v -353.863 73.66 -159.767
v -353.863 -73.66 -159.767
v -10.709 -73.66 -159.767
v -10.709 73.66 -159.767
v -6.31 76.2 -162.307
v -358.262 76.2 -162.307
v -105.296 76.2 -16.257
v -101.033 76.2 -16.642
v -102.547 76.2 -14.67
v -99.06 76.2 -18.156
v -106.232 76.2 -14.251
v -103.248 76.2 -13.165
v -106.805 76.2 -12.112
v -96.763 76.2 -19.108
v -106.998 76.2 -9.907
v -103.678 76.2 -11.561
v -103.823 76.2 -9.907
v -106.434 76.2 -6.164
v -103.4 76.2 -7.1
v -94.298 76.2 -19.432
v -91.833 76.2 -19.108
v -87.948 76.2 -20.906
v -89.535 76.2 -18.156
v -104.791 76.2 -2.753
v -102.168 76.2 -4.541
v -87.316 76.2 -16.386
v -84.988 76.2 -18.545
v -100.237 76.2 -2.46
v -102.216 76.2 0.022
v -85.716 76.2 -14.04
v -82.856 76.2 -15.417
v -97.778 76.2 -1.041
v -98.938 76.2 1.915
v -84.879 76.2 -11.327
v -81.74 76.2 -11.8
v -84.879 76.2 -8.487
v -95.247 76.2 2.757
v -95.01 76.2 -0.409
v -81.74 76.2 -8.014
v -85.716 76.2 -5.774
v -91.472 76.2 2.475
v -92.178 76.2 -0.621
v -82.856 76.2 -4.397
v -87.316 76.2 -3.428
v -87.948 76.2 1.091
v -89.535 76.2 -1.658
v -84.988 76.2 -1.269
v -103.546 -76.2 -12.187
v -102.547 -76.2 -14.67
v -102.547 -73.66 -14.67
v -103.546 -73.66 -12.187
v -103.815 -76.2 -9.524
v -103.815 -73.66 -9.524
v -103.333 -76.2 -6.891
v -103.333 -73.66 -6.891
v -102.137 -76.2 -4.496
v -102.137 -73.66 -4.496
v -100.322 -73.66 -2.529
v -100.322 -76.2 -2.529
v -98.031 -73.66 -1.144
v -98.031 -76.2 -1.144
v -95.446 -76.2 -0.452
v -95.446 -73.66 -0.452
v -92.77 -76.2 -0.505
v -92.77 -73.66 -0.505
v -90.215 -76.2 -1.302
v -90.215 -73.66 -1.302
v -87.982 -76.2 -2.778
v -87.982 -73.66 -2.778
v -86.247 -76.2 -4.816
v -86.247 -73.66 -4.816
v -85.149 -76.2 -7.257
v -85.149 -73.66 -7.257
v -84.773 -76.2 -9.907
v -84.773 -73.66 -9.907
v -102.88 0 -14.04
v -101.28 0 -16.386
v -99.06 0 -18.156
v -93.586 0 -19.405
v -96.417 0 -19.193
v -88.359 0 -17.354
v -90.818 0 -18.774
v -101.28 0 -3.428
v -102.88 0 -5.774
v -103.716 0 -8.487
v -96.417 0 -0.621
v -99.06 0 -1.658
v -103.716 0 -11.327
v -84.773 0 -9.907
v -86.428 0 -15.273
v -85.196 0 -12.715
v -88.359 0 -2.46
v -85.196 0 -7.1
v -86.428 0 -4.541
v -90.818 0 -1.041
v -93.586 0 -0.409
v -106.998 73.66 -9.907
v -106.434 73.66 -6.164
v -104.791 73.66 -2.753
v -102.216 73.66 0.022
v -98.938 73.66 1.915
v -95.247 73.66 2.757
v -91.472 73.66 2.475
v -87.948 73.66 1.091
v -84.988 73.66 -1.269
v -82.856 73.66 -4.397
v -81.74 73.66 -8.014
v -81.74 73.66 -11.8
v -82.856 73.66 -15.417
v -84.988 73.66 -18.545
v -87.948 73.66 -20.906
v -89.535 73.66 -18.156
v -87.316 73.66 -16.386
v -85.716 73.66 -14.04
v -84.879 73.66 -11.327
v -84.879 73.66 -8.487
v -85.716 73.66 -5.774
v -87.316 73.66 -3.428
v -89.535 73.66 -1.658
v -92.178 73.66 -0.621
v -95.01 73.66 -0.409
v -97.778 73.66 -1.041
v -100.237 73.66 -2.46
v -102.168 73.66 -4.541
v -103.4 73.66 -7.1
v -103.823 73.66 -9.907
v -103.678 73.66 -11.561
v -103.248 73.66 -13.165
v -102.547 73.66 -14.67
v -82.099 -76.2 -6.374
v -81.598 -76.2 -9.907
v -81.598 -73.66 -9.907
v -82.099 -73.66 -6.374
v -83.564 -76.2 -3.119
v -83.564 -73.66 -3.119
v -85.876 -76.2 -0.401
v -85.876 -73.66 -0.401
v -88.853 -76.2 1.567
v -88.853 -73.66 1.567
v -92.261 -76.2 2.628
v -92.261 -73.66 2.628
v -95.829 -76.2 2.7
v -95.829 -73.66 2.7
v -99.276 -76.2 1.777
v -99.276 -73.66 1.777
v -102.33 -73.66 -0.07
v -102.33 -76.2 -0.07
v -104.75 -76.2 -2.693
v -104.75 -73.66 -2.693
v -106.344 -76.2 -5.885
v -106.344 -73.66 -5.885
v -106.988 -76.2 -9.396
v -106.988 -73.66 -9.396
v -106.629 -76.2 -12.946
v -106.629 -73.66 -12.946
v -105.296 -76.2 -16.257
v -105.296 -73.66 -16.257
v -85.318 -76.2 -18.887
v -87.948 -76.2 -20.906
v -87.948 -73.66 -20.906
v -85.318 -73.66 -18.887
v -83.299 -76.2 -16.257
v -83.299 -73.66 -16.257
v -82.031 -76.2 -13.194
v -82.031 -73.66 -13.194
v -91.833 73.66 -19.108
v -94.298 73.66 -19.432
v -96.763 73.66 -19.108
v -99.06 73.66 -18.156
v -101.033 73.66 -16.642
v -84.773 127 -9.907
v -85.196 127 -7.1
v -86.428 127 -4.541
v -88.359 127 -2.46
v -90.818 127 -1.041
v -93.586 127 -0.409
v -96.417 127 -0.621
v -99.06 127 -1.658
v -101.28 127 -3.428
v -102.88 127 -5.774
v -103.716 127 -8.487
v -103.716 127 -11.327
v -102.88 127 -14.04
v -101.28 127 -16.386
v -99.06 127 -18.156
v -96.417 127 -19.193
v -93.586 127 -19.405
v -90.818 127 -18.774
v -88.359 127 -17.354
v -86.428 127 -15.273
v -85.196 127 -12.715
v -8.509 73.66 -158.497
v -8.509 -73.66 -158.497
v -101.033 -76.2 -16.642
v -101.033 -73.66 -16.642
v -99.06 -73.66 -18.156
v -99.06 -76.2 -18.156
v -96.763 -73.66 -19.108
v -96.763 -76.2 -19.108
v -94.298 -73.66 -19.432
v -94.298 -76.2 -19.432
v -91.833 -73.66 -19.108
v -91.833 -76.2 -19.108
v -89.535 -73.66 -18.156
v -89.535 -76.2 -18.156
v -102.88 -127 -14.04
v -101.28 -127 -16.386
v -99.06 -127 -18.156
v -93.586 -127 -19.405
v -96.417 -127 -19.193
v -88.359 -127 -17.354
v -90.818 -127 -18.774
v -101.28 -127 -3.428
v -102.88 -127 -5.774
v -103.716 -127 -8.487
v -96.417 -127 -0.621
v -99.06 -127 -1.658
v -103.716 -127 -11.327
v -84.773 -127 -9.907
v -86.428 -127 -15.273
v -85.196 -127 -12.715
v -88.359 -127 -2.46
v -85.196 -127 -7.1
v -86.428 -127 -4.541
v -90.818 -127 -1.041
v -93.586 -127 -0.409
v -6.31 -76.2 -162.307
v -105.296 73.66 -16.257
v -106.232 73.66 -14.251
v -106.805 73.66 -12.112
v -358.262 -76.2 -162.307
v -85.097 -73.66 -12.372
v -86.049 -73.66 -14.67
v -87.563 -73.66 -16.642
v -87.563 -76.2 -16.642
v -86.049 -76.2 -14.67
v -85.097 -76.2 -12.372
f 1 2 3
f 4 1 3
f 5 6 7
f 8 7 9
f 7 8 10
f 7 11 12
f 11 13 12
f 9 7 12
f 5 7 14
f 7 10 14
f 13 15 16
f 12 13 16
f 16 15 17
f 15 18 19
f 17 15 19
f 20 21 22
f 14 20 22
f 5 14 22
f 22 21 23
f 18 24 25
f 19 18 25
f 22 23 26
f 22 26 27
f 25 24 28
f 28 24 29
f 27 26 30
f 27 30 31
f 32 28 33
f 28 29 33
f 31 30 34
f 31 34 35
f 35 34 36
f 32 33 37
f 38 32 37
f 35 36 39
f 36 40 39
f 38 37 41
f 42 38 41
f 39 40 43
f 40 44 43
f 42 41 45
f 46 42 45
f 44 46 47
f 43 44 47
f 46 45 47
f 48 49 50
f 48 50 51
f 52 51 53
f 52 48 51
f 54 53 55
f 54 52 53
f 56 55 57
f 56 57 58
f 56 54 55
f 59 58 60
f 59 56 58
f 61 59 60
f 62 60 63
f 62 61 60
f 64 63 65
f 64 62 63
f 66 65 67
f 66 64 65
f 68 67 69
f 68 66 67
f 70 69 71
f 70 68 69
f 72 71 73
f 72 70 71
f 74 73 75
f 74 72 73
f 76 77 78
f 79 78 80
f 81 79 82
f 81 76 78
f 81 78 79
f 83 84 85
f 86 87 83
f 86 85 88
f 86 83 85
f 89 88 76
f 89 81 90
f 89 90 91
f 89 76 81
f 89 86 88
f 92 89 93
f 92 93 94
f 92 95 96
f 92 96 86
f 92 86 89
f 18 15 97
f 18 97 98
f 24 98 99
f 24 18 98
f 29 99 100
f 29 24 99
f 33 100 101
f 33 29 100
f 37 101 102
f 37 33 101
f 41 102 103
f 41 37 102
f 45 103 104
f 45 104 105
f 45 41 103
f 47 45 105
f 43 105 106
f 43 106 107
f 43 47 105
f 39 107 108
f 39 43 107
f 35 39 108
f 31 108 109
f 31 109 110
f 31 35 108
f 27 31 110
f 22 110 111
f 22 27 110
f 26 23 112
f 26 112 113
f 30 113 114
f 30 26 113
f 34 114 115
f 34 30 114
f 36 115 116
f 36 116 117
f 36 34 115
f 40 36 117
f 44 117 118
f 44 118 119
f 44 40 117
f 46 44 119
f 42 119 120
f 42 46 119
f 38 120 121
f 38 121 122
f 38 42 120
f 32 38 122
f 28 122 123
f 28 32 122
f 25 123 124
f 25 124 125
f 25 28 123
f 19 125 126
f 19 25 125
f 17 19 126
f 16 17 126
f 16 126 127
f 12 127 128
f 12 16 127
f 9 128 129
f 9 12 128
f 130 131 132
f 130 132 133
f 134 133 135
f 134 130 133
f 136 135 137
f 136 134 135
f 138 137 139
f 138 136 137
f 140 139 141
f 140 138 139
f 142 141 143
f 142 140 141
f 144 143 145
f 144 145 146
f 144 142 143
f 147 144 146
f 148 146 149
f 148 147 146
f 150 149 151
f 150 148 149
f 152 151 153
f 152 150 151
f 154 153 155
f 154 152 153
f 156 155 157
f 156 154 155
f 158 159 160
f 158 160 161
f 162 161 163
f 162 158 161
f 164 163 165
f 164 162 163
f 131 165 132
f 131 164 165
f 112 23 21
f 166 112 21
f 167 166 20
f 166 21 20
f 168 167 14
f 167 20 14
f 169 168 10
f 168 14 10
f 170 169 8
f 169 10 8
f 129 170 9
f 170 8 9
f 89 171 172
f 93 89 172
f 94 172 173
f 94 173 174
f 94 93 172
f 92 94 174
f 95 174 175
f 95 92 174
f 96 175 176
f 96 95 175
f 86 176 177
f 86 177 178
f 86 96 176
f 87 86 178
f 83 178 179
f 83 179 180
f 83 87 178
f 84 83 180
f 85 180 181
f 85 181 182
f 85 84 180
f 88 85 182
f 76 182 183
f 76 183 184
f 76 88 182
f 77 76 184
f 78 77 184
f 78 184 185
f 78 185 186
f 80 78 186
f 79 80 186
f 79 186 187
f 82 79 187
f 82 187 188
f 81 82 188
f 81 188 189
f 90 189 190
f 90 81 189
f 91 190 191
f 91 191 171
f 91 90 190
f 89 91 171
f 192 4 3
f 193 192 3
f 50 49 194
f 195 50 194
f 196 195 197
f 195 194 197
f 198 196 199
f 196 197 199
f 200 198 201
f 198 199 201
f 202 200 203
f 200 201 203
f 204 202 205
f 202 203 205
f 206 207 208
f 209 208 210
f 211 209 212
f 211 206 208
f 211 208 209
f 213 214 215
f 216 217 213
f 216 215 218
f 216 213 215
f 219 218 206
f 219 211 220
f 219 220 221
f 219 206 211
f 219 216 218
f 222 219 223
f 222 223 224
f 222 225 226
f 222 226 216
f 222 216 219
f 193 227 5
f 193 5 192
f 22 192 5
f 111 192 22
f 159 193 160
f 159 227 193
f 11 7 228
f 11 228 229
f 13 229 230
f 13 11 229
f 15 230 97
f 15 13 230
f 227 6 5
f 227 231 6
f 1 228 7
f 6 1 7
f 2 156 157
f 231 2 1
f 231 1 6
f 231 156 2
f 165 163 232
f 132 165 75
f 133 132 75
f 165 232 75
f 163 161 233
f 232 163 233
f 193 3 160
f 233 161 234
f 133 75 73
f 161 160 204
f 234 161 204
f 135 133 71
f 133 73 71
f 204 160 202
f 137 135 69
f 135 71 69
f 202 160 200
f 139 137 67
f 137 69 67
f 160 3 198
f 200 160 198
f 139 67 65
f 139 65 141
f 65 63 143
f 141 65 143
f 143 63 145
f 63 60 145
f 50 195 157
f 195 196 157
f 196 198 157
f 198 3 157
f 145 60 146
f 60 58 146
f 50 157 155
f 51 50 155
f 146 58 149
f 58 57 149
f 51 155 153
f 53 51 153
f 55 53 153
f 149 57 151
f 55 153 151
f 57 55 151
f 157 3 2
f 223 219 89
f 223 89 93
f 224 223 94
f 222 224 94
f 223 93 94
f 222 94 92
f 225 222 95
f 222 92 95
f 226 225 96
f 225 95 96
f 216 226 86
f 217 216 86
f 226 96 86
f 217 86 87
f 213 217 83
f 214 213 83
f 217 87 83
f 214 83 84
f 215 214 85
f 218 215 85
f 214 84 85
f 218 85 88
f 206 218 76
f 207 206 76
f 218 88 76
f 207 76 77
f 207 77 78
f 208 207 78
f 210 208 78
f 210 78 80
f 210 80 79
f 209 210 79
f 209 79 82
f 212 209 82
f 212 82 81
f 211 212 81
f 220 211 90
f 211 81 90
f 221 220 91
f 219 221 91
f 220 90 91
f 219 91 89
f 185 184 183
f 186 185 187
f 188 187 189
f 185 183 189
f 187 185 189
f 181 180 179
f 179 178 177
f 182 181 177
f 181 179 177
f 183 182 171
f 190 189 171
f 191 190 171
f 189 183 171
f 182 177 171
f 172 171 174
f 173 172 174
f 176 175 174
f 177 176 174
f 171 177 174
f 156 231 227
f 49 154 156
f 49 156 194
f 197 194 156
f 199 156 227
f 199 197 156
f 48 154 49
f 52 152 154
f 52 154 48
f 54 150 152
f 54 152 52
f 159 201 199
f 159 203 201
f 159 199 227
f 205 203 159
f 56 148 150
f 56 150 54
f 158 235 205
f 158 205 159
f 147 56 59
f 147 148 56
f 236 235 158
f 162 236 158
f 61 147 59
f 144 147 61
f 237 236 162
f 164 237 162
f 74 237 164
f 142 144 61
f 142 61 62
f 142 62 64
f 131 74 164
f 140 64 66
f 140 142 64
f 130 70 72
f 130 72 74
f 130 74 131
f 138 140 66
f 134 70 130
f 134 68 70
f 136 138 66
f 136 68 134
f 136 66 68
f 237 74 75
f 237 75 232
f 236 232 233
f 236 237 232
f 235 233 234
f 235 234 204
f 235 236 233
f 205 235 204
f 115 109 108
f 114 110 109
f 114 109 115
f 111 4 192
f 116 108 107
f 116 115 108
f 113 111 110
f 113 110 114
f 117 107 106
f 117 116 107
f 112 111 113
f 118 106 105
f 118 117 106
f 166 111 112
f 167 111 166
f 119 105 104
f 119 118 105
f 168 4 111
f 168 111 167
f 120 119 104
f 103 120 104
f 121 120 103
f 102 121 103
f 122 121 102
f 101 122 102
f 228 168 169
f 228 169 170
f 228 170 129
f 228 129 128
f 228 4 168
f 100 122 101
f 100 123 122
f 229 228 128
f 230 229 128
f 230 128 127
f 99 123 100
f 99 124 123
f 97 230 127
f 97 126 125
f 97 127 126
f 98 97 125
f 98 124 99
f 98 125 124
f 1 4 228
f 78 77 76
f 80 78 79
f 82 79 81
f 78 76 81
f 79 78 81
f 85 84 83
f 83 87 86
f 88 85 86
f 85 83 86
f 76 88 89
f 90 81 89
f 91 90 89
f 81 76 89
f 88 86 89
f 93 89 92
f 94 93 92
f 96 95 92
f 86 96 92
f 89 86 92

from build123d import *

# Parameters (mm, degrees)
F1_DEPTH  = 76.2
F2_T      = -2.54
F3_DEPTH  = 2.54
F5_DEPTH  = 2.54
F6_DEPTH  = 2.54
F8_DEPTH  = 2.54
F9_DEPTH  = 2.54
F10_R     = 9.525
F11_DEPTH = 127
F12_DEPTH = 127


with BuildPart() as f1:
    # F0 (on Front) → F1 (new body, symmetric)
    with BuildSketch(Plane.XZ):
        Polygon((-358.2624146525, -162.3070820507), (-6.3096905545, -162.3070820507), (-94.297871579, -9.9070820507), align=None)
    extrude(amount=F1_DEPTH, both=True)

    # F2
    f2_openings = [f1.faces().sort_by_distance(p)[0] for p in [
        (-226.280143, 0, -86.107082),
    ]]
    offset(amount=F2_T, openings=f2_openings)

    # F3 (cut): a face of the model
    f3_faces = [f1.faces().sort_by_distance(p)[0] for p in [
        (-53.6033378552, 0, -85.4720820507),
    ]]
    extrude(f3_faces, amount=-F3_DEPTH, mode=Mode.SUBTRACT)

    # F4 (on face) → F5 (join)
    with BuildSketch(Plane.XZ.offset(76.2)):
        with BuildLine():
            ThreePointArc((-87.947871579, -20.9056046787), (-83.299348951, -16.2570820507), (-81.597871579, -9.9070820507))
            ThreePointArc((-81.597871579, -9.9070820507), (-97.5848734518, 2.3601759432), (-105.2963942071, -16.2570820507))
            Line((-105.2963942071, -16.2570820507), (-102.5467635501, -14.6695820507))
            ThreePointArc((-102.5467635501, -14.6695820507), (-96.7631229836, -0.7066385553), (-84.772871579, -9.9070820507))
            ThreePointArc((-84.772871579, -9.9070820507), (-86.048979608, -14.6695820507), (-89.535371579, -18.1559740217))
            Line((-89.535371579, -18.1559740217), (-87.947871579, -20.9056046787))
        make_face()
    extrude(amount=-F5_DEPTH)

    # F4 (on face) → F6 (cut)
    with BuildSketch(Plane.XZ.offset(76.2)):
        with BuildLine():
            Line((-94.297871579, -9.9070820507), (-102.5467635501, -14.6695820507))
            ThreePointArc((-102.5467635501, -14.6695820507), (-96.7631229836, -19.1075255461), (-89.535371579, -18.1559740217))
            Line((-89.535371579, -18.1559740217), (-94.297871579, -9.9070820507))
        make_face()
    extrude(amount=-F6_DEPTH, mode=Mode.SUBTRACT)

    # F7 (on face) → F8 (join)
    with BuildSketch(Plane(origin=(0, 76.2, 0), x_dir=(-1, 0, 0), z_dir=(0, 1, 0))):
        with BuildLine():
            ThreePointArc((105.2963942071, -16.2570820507), (106.5651295729, -13.1940839235), (106.997871579, -9.9070820507))
            ThreePointArc((106.997871579, -9.9070820507), (87.947871579, 1.0914405774), (87.947871579, -20.9056046787))
            Line((87.947871579, -20.9056046787), (89.535371579, -18.1559740217))
            ThreePointArc((89.535371579, -18.1559740217), (89.535371579, -1.6581900796), (103.822871579, -9.9070820507))
            ThreePointArc((103.822871579, -9.9070820507), (103.4983150745, -12.3723334553), (102.5467635501, -14.6695820507))
            Line((102.5467635501, -14.6695820507), (105.2963942071, -16.2570820507))
        make_face()
    extrude(amount=-F8_DEPTH)

    # F7 (on face) → F9 (cut)
    with BuildSketch(Plane(origin=(0, 76.2, 0), x_dir=(-1, 0, 0), z_dir=(0, 1, 0))):
        with BuildLine():
            Line((94.297871579, -9.9070820507), (89.535371579, -18.1559740217))
            ThreePointArc((89.535371579, -18.1559740217), (96.7631229836, -19.1075255461), (102.5467635501, -14.6695820507))
            Line((102.5467635501, -14.6695820507), (94.297871579, -9.9070820507))
        make_face()
    extrude(amount=-F9_DEPTH, mode=Mode.SUBTRACT)


with BuildPart() as f11:
    # F10 (on Front) → F11 (new body)
    with BuildSketch(Plane.XZ):
        with Locations((-94.297871579, -9.9070820507)):
            Circle(F10_R)
    extrude(amount=F11_DEPTH)


with BuildPart() as f12:
    # F12 (new): a face of the model
    f12_faces = [f11.part.faces().sort_by_distance(p)[0] for p in [
        (-94.297871579, 0, -9.9070820507),
    ]]
    extrude(f12_faces, amount=F12_DEPTH)


solid = Compound([f1.part, f11.part, f12.part])
